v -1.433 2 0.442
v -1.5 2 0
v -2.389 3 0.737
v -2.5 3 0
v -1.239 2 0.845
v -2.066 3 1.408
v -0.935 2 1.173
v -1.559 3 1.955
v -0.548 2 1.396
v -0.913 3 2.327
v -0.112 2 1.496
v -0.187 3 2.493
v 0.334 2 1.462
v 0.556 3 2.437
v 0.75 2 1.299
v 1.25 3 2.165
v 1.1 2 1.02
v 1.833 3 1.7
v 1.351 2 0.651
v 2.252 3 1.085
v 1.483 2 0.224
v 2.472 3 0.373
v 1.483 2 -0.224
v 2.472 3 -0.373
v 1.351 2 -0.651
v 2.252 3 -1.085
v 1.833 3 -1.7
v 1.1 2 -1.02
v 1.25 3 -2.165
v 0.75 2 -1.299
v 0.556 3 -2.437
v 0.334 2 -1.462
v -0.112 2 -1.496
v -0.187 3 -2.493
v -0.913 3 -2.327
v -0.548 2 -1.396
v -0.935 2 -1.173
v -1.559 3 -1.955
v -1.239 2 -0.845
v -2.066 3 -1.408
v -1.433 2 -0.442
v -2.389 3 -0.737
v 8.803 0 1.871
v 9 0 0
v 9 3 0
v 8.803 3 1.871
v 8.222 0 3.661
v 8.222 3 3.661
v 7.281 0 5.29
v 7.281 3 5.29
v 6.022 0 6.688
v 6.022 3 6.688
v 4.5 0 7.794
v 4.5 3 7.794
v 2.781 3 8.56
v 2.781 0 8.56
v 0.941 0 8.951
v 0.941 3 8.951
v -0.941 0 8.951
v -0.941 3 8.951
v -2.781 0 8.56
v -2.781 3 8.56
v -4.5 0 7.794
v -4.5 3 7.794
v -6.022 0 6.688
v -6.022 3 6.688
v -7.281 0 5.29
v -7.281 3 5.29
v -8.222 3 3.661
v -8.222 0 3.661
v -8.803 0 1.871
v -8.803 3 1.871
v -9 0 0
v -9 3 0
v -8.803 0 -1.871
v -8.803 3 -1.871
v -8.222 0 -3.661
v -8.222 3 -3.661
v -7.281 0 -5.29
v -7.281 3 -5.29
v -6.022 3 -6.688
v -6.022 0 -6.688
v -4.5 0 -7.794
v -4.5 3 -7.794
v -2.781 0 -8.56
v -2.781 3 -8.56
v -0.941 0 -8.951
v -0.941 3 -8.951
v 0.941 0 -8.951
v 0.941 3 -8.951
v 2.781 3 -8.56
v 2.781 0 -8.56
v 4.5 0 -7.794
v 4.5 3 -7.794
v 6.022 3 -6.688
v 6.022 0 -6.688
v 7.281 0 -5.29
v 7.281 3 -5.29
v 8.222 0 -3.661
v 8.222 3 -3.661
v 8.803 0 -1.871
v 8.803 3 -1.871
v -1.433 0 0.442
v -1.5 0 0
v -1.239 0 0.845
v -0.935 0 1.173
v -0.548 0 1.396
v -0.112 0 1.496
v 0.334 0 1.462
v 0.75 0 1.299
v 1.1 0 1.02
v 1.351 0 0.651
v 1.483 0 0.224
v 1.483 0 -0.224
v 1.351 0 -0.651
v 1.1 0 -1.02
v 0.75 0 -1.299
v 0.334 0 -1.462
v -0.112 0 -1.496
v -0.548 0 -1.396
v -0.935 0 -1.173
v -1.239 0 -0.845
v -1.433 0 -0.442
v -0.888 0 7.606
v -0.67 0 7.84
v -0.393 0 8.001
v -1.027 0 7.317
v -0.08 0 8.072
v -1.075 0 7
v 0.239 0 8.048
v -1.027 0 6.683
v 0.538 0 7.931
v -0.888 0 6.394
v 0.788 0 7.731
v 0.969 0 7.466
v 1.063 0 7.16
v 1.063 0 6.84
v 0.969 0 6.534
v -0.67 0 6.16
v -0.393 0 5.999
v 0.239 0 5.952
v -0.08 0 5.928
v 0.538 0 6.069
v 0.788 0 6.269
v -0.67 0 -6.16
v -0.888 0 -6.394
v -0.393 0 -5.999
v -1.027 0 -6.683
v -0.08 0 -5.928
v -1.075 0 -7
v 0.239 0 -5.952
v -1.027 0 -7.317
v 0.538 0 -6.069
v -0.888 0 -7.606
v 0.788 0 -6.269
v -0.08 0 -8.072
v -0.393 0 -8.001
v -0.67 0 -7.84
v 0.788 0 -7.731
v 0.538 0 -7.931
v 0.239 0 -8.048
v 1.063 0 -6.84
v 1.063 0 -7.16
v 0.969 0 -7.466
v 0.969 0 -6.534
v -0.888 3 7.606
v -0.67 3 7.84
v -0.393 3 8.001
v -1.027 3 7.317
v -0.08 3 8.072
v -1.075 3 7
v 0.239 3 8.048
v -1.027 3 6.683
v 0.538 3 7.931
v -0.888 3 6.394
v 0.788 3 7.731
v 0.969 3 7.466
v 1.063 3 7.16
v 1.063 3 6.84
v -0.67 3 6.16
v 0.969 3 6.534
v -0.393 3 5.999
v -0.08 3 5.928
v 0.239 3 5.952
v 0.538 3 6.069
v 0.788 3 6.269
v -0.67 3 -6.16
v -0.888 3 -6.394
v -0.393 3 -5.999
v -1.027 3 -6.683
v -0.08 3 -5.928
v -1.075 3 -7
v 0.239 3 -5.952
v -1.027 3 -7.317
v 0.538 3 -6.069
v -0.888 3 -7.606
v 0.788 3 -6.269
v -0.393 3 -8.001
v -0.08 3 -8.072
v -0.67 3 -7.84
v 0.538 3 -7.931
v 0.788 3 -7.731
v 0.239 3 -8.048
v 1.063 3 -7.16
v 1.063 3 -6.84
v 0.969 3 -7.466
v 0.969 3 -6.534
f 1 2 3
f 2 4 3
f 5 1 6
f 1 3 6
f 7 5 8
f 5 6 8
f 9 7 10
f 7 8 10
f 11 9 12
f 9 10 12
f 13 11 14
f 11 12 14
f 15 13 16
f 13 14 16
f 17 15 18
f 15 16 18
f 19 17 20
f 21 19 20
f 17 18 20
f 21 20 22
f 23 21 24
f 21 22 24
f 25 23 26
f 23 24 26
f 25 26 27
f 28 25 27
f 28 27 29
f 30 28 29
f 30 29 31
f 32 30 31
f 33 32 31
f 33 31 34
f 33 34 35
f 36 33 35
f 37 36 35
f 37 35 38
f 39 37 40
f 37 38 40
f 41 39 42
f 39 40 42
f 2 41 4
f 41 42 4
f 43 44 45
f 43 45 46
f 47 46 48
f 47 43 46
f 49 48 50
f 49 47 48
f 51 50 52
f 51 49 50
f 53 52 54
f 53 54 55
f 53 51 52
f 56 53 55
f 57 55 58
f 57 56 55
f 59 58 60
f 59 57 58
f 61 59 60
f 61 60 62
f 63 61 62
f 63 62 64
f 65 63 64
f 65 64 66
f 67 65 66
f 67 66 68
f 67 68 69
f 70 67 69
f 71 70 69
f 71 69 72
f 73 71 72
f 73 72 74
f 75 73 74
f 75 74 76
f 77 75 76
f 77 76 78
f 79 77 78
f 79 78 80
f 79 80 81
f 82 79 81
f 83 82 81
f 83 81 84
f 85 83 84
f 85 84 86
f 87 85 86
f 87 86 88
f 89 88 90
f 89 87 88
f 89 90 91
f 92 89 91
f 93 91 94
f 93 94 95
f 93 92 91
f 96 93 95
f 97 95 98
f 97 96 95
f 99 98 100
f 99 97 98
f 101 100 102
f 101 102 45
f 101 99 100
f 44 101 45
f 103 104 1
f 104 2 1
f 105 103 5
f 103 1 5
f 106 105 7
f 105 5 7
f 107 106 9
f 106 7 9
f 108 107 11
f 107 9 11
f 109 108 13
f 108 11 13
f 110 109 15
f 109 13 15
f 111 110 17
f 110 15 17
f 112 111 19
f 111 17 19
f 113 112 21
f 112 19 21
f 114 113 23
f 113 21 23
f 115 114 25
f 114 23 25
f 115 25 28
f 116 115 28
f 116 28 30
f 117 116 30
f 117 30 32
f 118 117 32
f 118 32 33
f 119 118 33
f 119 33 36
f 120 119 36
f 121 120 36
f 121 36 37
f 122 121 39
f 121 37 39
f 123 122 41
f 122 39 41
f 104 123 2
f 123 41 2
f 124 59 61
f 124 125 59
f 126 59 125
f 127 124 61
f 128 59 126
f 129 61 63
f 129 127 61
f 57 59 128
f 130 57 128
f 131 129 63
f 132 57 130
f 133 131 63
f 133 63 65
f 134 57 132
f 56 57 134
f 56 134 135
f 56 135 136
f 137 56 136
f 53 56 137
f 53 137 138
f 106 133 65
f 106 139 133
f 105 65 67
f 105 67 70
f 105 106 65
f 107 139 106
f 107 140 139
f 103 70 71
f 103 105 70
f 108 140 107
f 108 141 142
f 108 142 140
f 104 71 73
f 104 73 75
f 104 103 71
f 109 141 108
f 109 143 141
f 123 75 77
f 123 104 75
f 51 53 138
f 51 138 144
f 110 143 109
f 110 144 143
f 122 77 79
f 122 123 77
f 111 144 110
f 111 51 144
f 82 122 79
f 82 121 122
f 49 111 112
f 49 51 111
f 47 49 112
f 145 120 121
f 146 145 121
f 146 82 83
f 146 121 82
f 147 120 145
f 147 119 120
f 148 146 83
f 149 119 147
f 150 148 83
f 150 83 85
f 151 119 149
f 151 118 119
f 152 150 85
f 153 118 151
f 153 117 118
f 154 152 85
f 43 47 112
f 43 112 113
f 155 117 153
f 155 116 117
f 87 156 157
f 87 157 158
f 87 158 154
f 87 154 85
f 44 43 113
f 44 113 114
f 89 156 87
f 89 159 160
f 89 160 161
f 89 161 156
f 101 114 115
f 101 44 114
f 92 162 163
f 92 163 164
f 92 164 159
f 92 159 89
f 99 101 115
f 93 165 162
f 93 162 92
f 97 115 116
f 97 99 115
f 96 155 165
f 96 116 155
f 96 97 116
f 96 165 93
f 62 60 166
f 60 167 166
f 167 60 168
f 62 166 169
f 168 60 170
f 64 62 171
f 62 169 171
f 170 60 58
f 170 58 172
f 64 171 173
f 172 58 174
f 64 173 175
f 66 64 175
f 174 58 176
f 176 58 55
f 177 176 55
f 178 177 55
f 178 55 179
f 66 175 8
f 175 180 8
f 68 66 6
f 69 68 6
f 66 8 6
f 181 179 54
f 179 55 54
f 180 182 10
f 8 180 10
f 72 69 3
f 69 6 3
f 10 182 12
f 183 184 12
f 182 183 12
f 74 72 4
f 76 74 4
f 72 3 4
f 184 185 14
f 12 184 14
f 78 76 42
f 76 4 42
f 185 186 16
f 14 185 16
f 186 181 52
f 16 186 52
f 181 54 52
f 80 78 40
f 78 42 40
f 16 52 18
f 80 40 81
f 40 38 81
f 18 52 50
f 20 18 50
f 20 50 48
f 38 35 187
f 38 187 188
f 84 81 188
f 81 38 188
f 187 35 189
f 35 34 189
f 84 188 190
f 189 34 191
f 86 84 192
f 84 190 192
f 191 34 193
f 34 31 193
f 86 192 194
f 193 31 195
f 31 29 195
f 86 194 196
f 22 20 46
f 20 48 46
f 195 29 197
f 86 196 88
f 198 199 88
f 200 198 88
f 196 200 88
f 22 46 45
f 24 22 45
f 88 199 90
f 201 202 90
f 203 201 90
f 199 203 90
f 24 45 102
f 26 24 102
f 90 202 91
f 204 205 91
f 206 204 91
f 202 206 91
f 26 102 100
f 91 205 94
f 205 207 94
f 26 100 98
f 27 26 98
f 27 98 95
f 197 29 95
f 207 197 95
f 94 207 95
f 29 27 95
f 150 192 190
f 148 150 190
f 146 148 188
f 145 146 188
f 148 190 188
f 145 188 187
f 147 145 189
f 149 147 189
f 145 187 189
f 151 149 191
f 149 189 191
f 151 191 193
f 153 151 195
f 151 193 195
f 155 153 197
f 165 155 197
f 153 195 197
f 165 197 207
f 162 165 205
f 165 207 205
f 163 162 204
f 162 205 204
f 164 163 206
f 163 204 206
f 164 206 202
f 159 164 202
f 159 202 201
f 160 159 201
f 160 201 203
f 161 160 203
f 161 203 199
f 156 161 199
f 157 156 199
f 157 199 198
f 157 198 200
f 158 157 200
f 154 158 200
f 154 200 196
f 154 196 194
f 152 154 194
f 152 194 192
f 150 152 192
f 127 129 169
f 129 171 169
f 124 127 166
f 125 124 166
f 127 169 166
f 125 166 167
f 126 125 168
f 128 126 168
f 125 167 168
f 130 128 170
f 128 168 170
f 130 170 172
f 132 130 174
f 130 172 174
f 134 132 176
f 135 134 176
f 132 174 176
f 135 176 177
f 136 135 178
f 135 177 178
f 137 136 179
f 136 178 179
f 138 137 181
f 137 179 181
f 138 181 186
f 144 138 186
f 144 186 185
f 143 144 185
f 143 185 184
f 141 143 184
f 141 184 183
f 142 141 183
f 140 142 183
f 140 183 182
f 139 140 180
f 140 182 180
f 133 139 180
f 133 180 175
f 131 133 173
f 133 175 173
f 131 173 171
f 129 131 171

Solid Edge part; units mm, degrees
sketch "Sketch1" plane through (0, 0, 0) normal (0, -1, 0) x (1, 0, 0)
  circle A0 centre (0, 0) radius 9
  dimension "D1" = 18
extrude "Ajout_matière_1" add sketch "Sketch1" against normal blind 3
sketch "Sketch2" plane through (0, 3, 0) normal (0, 1, 0) x (-1, 0, 0)
  circle A0 centre (0, -7) radius 1.075
  circle A1 centre (0, 0) radius 1.5
  circle A2 centre (0, 7) radius 1.075
  dimension "D1" = 2.15
  dimension "D2" = 7
  dimension "D3" = 3
extrude "Enlèvement_matière_1" cut sketch "Sketch2" against normal blind 8.787
chamfer "Chamfer1" distance 1 angle 45 1 edges at (1.5, 3, 0)
properties part number "14" material "PMMA"
